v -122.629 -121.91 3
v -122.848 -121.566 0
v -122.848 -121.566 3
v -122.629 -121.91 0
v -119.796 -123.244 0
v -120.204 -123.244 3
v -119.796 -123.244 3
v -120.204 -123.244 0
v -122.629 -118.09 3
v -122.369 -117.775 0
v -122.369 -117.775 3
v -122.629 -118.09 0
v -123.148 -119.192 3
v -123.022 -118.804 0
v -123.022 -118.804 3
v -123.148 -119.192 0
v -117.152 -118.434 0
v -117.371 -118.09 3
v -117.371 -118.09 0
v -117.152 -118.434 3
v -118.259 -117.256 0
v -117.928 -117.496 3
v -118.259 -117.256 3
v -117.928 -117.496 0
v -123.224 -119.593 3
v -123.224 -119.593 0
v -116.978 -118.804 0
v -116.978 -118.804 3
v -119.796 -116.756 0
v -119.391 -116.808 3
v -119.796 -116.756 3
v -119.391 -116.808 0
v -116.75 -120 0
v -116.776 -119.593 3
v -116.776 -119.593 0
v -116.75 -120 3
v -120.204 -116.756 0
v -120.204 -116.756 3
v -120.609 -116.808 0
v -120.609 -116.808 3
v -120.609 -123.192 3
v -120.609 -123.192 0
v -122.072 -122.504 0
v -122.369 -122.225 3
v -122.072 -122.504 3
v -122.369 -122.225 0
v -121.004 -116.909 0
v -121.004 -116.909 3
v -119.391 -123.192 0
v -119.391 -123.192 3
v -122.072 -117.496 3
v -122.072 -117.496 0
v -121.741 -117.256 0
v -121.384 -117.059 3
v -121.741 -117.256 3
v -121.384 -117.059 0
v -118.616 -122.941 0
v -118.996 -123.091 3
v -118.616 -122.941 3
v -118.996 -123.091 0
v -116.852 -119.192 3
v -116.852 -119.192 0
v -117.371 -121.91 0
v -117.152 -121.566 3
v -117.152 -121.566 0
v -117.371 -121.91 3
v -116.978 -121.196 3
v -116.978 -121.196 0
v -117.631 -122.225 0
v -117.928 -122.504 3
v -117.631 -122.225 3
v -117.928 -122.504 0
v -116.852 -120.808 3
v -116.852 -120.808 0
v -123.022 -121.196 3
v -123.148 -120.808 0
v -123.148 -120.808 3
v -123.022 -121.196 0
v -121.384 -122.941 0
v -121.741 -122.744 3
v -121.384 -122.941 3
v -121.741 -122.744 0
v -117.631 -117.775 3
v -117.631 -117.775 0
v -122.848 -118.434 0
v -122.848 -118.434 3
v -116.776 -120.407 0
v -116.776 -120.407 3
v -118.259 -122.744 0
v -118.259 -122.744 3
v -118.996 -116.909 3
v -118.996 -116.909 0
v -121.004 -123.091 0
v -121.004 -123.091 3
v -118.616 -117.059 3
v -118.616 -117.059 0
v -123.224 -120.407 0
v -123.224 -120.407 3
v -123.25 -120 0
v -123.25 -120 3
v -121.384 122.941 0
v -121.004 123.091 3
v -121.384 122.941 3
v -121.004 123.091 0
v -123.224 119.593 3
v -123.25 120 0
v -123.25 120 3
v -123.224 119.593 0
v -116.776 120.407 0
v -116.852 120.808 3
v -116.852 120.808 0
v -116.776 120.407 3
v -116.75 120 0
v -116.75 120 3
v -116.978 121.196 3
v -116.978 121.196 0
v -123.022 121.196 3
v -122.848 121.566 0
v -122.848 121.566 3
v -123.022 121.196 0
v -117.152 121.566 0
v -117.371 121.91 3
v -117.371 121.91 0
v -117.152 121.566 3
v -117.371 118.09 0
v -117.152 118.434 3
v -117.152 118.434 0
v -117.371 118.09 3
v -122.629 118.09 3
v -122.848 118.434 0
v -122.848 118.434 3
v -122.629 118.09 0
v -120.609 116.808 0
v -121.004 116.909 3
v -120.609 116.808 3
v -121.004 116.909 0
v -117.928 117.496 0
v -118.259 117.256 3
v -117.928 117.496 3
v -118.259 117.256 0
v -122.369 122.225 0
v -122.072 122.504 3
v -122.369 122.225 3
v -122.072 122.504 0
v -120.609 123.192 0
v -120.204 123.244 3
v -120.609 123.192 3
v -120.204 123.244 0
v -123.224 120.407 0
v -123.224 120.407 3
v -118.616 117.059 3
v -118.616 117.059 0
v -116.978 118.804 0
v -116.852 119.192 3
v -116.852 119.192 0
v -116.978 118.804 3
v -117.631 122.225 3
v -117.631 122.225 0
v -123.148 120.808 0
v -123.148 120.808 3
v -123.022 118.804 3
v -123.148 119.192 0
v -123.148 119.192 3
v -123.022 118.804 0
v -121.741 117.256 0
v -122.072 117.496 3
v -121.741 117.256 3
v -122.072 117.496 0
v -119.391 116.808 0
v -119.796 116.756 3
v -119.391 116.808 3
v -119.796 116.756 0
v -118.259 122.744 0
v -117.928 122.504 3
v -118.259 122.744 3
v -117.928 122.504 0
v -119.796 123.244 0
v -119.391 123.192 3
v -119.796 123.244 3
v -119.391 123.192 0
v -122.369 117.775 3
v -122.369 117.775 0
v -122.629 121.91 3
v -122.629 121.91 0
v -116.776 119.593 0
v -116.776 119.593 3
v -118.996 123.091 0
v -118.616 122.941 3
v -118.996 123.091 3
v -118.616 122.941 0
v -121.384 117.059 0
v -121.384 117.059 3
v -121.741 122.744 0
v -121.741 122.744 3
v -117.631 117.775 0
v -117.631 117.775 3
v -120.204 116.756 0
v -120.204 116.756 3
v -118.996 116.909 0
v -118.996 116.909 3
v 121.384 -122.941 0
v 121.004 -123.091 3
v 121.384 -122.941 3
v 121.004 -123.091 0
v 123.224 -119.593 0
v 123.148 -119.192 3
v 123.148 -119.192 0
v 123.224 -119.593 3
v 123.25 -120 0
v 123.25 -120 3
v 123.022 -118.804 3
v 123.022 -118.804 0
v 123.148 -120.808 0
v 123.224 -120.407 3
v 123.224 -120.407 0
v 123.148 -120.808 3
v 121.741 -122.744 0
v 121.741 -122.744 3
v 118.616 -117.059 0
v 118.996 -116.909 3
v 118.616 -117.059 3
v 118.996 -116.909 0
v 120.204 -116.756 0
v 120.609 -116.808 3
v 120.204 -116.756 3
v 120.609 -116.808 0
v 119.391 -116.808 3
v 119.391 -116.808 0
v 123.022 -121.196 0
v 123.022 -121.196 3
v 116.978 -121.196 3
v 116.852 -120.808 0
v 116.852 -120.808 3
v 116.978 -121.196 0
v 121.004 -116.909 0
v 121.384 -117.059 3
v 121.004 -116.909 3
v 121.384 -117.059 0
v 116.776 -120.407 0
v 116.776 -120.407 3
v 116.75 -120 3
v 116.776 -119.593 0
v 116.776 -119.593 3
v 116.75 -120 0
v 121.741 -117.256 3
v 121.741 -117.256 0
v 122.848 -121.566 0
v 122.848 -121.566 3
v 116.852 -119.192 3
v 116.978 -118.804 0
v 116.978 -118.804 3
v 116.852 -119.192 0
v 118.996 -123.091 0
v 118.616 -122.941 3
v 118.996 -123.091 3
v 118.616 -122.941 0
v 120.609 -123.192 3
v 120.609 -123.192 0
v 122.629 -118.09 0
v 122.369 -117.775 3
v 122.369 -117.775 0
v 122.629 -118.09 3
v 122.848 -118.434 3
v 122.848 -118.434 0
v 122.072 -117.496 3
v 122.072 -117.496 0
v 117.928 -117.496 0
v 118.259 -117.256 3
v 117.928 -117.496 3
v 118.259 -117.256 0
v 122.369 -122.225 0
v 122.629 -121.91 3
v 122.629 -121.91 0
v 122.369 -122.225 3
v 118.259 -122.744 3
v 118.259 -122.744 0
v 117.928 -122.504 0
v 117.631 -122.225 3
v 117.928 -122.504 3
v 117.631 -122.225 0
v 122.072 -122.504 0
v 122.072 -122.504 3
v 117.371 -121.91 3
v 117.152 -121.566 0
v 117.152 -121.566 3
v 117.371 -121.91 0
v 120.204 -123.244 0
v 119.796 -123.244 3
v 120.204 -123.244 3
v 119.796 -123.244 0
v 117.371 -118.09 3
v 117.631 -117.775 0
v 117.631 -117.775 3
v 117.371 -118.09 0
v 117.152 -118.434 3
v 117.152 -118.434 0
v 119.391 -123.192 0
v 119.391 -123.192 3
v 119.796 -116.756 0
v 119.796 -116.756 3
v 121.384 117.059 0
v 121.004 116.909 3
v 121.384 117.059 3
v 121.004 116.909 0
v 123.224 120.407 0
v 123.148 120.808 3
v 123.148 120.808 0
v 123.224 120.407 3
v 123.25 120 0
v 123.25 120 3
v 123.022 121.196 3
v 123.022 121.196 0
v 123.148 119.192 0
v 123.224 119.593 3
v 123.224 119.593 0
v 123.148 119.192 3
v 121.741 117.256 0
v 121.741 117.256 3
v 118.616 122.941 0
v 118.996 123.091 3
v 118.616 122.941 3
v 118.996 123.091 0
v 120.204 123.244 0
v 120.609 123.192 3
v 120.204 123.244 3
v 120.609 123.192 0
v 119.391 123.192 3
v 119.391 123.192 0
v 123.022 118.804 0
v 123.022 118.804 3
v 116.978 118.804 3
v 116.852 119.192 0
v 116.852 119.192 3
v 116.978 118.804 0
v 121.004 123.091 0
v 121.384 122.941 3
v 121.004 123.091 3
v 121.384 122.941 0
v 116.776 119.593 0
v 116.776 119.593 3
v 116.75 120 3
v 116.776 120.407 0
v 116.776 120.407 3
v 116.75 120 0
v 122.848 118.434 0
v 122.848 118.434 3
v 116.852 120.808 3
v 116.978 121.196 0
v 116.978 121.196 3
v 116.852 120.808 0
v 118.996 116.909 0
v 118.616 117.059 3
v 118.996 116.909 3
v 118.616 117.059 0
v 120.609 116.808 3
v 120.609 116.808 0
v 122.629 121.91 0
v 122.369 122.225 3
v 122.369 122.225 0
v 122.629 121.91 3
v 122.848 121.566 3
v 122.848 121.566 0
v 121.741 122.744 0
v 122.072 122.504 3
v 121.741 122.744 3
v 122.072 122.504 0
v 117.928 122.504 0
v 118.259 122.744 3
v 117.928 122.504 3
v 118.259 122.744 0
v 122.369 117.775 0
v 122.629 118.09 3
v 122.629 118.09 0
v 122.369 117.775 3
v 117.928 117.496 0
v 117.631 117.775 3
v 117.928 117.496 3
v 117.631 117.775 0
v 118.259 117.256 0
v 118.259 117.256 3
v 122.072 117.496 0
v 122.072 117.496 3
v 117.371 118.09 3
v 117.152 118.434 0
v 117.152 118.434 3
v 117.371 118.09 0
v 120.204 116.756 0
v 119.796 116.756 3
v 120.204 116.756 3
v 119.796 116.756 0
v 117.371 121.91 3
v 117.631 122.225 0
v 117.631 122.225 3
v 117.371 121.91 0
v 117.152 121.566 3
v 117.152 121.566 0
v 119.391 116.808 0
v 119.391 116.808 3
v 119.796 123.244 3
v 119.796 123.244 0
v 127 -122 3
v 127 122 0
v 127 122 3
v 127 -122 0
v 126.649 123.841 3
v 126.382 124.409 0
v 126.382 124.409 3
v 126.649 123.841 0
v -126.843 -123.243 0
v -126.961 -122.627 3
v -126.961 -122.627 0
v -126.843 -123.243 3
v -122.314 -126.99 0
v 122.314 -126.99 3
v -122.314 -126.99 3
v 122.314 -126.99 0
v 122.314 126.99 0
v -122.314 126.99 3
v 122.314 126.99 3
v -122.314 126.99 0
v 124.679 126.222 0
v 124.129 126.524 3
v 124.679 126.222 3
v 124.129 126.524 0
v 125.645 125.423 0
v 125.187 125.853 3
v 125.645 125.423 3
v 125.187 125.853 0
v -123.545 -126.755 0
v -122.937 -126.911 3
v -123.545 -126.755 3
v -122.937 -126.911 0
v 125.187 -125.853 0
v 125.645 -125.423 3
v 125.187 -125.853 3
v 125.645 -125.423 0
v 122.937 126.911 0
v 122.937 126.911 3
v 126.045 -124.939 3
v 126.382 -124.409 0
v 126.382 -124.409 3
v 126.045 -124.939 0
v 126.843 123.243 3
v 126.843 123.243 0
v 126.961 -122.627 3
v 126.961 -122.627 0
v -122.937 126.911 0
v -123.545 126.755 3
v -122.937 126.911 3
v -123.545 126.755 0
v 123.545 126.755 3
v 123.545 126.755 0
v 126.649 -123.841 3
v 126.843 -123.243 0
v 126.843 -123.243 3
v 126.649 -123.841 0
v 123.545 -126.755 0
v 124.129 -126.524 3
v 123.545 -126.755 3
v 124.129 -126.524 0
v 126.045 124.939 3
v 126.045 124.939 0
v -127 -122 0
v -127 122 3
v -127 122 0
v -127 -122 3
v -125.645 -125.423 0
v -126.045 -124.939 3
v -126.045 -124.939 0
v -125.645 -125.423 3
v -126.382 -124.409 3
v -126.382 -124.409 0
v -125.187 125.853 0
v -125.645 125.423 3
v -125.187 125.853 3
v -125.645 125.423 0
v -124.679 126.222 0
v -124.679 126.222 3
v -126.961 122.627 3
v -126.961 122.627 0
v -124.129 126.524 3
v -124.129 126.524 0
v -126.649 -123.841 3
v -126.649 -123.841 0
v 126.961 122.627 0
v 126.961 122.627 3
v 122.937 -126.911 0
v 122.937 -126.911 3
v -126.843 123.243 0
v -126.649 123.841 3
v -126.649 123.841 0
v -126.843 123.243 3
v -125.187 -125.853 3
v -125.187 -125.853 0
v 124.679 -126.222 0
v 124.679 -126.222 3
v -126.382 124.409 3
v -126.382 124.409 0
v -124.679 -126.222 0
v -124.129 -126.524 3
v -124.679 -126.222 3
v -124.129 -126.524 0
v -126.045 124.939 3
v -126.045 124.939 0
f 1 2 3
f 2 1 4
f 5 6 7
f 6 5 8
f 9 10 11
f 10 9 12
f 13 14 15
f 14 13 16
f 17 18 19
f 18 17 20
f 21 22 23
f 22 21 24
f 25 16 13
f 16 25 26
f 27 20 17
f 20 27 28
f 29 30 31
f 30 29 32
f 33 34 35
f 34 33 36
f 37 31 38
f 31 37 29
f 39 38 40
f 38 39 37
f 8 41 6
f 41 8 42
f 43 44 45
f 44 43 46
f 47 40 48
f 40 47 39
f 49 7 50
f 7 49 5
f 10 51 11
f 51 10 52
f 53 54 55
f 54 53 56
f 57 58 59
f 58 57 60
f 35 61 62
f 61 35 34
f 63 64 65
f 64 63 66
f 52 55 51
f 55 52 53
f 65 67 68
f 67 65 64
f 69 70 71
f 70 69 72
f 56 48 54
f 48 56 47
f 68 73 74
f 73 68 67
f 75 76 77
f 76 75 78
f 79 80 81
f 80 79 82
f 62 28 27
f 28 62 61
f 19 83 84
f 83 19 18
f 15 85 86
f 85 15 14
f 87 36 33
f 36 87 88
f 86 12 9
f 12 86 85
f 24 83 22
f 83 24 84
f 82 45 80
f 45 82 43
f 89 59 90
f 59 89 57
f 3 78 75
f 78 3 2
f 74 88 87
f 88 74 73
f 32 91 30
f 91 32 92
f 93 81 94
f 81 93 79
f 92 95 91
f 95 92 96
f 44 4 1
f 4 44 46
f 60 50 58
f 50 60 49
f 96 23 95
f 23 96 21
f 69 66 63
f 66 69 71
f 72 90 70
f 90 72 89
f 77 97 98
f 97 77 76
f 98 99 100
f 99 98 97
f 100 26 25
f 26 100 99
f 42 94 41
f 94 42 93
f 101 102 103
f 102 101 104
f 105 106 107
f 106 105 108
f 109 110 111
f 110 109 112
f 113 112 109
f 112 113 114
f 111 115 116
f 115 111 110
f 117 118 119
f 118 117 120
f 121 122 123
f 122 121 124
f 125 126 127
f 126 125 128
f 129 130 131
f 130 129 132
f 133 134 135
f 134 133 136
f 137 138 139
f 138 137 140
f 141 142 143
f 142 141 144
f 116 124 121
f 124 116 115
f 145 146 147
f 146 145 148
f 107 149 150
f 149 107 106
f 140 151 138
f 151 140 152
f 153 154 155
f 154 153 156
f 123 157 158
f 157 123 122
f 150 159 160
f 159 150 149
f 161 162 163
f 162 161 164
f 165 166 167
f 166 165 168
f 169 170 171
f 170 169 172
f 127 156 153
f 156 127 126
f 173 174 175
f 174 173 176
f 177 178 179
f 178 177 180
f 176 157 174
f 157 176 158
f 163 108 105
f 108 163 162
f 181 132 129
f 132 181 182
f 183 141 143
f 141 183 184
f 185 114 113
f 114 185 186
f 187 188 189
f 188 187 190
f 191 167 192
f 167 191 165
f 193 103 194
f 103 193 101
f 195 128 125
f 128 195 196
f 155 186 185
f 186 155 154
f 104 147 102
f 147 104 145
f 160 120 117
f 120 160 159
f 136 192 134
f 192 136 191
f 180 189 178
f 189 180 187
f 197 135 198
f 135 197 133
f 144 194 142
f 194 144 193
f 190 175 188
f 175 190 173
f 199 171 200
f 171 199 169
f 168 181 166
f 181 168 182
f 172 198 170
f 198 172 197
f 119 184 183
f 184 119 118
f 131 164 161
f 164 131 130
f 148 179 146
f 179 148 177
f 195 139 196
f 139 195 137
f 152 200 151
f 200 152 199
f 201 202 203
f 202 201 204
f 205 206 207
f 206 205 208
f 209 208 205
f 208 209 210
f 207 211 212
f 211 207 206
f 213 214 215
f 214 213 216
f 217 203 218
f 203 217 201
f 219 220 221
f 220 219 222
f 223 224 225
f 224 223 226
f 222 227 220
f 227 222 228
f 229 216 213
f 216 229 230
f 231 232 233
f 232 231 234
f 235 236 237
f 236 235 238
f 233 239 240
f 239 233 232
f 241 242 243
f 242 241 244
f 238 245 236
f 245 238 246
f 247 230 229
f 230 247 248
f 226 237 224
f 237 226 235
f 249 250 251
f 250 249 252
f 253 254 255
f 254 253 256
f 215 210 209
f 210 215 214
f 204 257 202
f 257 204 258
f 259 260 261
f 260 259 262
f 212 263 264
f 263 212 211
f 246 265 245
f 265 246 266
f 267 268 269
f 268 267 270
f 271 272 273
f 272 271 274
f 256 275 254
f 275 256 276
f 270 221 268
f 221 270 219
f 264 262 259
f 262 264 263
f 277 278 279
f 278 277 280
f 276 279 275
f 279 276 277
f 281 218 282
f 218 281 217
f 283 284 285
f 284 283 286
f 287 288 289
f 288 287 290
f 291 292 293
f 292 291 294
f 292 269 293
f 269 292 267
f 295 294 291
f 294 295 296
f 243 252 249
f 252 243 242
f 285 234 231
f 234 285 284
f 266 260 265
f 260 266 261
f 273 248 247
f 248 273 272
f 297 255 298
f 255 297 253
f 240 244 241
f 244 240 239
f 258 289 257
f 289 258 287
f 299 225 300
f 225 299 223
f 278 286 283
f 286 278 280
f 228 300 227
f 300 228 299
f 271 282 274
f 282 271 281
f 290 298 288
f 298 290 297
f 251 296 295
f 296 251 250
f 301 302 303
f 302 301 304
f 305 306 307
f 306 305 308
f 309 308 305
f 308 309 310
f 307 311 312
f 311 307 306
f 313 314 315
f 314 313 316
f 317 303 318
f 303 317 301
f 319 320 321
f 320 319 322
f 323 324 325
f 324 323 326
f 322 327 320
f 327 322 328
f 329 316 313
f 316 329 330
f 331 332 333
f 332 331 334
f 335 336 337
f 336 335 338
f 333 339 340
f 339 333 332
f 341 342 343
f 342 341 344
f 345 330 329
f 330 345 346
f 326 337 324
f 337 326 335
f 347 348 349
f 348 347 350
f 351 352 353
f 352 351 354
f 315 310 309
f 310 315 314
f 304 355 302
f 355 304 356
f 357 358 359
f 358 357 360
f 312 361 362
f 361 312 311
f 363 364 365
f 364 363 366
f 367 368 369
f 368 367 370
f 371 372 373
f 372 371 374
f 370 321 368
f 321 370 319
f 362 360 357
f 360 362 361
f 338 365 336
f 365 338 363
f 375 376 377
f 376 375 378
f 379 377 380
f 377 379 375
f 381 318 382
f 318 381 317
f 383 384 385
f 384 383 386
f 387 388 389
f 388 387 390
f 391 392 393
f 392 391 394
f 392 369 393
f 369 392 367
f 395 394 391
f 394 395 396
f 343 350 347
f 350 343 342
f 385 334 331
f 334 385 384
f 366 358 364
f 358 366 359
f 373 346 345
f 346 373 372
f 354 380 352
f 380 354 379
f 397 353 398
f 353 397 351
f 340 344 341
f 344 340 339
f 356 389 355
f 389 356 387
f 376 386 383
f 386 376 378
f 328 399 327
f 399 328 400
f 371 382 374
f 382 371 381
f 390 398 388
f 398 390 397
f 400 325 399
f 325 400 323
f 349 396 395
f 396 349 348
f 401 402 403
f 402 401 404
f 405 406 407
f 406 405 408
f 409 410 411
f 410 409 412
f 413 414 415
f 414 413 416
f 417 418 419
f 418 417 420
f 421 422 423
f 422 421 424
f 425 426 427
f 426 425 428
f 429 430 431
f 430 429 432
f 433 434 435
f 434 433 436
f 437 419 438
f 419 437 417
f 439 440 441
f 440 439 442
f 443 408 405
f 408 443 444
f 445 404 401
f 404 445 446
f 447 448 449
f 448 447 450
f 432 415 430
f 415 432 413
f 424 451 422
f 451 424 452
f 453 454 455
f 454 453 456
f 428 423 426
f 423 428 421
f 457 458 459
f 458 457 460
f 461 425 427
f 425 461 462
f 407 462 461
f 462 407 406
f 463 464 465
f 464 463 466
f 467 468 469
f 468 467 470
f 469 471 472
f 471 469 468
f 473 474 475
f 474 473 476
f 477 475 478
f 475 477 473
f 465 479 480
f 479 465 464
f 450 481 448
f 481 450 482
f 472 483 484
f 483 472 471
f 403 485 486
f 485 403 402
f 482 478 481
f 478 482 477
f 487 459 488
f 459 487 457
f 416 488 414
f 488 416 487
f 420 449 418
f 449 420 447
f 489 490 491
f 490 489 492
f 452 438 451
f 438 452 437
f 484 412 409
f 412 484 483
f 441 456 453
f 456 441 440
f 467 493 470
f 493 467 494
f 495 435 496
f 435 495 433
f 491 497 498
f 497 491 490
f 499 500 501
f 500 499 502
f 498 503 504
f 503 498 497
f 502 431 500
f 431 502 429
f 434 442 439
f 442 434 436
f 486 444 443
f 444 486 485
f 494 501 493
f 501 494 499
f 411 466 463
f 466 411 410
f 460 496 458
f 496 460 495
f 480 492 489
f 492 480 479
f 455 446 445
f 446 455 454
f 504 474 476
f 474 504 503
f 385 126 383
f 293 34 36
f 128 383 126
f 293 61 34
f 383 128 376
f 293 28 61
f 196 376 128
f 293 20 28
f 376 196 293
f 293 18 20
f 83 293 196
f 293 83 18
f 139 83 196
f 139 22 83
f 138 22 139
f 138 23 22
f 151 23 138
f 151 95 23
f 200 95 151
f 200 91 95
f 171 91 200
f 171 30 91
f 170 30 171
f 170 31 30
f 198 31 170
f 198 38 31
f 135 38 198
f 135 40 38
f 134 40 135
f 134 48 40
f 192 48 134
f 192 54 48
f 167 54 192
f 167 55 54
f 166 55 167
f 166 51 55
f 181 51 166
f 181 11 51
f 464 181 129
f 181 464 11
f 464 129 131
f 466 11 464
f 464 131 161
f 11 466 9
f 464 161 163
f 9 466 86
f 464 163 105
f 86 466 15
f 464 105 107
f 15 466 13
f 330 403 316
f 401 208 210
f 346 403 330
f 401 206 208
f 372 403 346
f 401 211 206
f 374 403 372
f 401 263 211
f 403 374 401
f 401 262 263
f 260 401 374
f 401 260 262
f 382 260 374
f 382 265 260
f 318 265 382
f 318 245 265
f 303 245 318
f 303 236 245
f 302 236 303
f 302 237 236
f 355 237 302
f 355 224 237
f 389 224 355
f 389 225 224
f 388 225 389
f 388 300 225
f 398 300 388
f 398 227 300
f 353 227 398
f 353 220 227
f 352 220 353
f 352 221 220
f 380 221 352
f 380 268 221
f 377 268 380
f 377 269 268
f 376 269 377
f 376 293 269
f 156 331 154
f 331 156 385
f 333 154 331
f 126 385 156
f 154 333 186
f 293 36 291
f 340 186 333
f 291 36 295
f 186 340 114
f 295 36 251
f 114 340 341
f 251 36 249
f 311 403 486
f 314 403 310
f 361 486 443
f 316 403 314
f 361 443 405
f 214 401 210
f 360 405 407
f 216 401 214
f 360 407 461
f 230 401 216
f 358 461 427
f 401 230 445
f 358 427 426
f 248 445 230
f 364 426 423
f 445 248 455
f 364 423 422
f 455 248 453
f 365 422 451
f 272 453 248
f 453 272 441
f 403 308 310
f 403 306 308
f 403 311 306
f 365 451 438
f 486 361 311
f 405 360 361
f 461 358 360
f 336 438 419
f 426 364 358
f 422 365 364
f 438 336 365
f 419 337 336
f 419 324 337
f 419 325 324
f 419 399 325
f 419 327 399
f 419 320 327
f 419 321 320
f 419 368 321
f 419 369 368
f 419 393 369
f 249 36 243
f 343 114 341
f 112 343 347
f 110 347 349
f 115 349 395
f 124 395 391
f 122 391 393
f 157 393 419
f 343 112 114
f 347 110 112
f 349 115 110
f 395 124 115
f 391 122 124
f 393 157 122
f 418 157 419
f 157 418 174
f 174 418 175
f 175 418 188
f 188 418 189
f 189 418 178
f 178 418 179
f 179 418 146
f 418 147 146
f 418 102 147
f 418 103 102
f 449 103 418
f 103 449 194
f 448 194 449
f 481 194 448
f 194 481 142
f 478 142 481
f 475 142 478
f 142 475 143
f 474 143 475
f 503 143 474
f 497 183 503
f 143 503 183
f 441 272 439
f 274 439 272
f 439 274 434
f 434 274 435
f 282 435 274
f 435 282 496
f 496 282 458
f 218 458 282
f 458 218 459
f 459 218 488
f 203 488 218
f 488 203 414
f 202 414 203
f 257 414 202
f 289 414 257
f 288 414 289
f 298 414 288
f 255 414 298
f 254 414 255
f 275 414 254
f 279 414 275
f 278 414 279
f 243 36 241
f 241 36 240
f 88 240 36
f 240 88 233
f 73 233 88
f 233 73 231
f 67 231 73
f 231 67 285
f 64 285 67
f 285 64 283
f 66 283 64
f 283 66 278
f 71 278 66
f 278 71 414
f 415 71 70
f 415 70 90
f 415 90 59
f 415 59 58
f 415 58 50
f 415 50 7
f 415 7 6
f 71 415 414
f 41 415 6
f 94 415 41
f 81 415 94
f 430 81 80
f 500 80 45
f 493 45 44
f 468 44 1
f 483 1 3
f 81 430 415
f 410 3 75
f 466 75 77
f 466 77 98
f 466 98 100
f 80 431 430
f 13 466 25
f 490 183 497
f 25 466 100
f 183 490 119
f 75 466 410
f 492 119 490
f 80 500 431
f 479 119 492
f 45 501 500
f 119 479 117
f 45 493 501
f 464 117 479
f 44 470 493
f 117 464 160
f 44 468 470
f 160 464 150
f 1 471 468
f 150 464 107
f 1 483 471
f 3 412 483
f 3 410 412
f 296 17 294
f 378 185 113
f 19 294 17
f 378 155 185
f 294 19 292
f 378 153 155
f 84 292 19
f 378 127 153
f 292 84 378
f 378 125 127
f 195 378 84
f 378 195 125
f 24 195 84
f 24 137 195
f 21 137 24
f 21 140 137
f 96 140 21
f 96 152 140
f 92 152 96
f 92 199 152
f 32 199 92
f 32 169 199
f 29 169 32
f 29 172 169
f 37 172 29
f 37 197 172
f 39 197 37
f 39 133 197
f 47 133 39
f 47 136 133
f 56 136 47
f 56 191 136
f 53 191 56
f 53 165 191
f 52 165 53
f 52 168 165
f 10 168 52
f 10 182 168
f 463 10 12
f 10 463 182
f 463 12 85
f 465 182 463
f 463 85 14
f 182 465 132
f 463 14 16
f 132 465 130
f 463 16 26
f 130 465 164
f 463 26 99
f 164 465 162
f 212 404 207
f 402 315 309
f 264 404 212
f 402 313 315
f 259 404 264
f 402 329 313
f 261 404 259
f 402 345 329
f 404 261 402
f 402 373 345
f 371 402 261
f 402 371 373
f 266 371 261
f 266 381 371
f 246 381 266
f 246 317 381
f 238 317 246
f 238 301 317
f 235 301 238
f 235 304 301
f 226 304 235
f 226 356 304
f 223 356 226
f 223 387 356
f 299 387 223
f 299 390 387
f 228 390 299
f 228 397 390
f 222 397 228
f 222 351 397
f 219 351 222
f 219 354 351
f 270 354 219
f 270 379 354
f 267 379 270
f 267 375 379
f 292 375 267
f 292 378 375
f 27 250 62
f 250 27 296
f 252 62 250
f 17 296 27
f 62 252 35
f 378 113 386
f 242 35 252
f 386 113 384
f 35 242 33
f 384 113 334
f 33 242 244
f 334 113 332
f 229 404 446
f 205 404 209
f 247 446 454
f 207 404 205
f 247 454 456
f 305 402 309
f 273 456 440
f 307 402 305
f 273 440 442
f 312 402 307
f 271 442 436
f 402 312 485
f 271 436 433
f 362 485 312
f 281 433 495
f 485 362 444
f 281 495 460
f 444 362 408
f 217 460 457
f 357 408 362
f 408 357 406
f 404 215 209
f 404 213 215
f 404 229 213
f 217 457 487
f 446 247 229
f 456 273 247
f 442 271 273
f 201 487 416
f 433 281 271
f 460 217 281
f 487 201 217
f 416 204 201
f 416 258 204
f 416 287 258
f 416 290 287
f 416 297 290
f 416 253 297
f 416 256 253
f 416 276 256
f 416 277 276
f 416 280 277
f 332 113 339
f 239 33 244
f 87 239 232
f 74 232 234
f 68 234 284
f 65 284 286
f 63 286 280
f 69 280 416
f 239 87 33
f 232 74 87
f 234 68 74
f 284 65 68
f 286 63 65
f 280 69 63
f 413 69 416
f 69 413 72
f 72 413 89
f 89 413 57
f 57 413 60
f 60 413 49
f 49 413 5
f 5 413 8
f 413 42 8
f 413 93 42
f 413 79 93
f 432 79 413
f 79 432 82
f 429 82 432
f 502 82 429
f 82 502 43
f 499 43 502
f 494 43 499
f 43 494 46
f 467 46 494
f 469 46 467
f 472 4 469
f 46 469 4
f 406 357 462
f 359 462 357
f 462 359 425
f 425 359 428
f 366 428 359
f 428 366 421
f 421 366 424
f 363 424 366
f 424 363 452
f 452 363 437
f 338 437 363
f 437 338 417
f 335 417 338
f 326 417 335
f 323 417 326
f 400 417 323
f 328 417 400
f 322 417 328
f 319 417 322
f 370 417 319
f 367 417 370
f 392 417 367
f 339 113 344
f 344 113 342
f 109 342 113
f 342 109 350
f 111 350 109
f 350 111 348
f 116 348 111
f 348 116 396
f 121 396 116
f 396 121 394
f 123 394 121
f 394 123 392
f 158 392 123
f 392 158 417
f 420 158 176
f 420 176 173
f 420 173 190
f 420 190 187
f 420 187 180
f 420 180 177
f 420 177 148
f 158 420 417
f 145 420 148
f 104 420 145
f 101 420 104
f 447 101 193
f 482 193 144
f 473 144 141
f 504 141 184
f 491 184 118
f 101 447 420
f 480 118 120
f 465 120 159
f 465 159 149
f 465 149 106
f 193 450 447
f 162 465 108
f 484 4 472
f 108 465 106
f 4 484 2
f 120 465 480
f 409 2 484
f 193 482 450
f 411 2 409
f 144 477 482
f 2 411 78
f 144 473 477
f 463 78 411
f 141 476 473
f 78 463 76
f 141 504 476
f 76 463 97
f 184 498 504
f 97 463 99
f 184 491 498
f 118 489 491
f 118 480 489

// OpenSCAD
$fn = 50;


difference() {
	union() {
		hull() {
			translate(v = [-122.0000000000, 122.0000000000, 0]) {
				cylinder(h = 3, r = 5);
			}
			translate(v = [122.0000000000, 122.0000000000, 0]) {
				cylinder(h = 3, r = 5);
			}
			translate(v = [-122.0000000000, -122.0000000000, 0]) {
				cylinder(h = 3, r = 5);
			}
			translate(v = [122.0000000000, -122.0000000000, 0]) {
				cylinder(h = 3, r = 5);
			}
		}
	}
	union() {
		translate(v = [-120.0000000000, -120.0000000000, -100.0000000000]) {
			cylinder(h = 200, r = 3.2500000000);
		}
		translate(v = [-120.0000000000, 120.0000000000, -100.0000000000]) {
			cylinder(h = 200, r = 3.2500000000);
		}
		translate(v = [120.0000000000, -120.0000000000, -100.0000000000]) {
			cylinder(h = 200, r = 3.2500000000);
		}
		translate(v = [120.0000000000, 120.0000000000, -100.0000000000]) {
			cylinder(h = 200, r = 3.2500000000);
		}
	}
}
